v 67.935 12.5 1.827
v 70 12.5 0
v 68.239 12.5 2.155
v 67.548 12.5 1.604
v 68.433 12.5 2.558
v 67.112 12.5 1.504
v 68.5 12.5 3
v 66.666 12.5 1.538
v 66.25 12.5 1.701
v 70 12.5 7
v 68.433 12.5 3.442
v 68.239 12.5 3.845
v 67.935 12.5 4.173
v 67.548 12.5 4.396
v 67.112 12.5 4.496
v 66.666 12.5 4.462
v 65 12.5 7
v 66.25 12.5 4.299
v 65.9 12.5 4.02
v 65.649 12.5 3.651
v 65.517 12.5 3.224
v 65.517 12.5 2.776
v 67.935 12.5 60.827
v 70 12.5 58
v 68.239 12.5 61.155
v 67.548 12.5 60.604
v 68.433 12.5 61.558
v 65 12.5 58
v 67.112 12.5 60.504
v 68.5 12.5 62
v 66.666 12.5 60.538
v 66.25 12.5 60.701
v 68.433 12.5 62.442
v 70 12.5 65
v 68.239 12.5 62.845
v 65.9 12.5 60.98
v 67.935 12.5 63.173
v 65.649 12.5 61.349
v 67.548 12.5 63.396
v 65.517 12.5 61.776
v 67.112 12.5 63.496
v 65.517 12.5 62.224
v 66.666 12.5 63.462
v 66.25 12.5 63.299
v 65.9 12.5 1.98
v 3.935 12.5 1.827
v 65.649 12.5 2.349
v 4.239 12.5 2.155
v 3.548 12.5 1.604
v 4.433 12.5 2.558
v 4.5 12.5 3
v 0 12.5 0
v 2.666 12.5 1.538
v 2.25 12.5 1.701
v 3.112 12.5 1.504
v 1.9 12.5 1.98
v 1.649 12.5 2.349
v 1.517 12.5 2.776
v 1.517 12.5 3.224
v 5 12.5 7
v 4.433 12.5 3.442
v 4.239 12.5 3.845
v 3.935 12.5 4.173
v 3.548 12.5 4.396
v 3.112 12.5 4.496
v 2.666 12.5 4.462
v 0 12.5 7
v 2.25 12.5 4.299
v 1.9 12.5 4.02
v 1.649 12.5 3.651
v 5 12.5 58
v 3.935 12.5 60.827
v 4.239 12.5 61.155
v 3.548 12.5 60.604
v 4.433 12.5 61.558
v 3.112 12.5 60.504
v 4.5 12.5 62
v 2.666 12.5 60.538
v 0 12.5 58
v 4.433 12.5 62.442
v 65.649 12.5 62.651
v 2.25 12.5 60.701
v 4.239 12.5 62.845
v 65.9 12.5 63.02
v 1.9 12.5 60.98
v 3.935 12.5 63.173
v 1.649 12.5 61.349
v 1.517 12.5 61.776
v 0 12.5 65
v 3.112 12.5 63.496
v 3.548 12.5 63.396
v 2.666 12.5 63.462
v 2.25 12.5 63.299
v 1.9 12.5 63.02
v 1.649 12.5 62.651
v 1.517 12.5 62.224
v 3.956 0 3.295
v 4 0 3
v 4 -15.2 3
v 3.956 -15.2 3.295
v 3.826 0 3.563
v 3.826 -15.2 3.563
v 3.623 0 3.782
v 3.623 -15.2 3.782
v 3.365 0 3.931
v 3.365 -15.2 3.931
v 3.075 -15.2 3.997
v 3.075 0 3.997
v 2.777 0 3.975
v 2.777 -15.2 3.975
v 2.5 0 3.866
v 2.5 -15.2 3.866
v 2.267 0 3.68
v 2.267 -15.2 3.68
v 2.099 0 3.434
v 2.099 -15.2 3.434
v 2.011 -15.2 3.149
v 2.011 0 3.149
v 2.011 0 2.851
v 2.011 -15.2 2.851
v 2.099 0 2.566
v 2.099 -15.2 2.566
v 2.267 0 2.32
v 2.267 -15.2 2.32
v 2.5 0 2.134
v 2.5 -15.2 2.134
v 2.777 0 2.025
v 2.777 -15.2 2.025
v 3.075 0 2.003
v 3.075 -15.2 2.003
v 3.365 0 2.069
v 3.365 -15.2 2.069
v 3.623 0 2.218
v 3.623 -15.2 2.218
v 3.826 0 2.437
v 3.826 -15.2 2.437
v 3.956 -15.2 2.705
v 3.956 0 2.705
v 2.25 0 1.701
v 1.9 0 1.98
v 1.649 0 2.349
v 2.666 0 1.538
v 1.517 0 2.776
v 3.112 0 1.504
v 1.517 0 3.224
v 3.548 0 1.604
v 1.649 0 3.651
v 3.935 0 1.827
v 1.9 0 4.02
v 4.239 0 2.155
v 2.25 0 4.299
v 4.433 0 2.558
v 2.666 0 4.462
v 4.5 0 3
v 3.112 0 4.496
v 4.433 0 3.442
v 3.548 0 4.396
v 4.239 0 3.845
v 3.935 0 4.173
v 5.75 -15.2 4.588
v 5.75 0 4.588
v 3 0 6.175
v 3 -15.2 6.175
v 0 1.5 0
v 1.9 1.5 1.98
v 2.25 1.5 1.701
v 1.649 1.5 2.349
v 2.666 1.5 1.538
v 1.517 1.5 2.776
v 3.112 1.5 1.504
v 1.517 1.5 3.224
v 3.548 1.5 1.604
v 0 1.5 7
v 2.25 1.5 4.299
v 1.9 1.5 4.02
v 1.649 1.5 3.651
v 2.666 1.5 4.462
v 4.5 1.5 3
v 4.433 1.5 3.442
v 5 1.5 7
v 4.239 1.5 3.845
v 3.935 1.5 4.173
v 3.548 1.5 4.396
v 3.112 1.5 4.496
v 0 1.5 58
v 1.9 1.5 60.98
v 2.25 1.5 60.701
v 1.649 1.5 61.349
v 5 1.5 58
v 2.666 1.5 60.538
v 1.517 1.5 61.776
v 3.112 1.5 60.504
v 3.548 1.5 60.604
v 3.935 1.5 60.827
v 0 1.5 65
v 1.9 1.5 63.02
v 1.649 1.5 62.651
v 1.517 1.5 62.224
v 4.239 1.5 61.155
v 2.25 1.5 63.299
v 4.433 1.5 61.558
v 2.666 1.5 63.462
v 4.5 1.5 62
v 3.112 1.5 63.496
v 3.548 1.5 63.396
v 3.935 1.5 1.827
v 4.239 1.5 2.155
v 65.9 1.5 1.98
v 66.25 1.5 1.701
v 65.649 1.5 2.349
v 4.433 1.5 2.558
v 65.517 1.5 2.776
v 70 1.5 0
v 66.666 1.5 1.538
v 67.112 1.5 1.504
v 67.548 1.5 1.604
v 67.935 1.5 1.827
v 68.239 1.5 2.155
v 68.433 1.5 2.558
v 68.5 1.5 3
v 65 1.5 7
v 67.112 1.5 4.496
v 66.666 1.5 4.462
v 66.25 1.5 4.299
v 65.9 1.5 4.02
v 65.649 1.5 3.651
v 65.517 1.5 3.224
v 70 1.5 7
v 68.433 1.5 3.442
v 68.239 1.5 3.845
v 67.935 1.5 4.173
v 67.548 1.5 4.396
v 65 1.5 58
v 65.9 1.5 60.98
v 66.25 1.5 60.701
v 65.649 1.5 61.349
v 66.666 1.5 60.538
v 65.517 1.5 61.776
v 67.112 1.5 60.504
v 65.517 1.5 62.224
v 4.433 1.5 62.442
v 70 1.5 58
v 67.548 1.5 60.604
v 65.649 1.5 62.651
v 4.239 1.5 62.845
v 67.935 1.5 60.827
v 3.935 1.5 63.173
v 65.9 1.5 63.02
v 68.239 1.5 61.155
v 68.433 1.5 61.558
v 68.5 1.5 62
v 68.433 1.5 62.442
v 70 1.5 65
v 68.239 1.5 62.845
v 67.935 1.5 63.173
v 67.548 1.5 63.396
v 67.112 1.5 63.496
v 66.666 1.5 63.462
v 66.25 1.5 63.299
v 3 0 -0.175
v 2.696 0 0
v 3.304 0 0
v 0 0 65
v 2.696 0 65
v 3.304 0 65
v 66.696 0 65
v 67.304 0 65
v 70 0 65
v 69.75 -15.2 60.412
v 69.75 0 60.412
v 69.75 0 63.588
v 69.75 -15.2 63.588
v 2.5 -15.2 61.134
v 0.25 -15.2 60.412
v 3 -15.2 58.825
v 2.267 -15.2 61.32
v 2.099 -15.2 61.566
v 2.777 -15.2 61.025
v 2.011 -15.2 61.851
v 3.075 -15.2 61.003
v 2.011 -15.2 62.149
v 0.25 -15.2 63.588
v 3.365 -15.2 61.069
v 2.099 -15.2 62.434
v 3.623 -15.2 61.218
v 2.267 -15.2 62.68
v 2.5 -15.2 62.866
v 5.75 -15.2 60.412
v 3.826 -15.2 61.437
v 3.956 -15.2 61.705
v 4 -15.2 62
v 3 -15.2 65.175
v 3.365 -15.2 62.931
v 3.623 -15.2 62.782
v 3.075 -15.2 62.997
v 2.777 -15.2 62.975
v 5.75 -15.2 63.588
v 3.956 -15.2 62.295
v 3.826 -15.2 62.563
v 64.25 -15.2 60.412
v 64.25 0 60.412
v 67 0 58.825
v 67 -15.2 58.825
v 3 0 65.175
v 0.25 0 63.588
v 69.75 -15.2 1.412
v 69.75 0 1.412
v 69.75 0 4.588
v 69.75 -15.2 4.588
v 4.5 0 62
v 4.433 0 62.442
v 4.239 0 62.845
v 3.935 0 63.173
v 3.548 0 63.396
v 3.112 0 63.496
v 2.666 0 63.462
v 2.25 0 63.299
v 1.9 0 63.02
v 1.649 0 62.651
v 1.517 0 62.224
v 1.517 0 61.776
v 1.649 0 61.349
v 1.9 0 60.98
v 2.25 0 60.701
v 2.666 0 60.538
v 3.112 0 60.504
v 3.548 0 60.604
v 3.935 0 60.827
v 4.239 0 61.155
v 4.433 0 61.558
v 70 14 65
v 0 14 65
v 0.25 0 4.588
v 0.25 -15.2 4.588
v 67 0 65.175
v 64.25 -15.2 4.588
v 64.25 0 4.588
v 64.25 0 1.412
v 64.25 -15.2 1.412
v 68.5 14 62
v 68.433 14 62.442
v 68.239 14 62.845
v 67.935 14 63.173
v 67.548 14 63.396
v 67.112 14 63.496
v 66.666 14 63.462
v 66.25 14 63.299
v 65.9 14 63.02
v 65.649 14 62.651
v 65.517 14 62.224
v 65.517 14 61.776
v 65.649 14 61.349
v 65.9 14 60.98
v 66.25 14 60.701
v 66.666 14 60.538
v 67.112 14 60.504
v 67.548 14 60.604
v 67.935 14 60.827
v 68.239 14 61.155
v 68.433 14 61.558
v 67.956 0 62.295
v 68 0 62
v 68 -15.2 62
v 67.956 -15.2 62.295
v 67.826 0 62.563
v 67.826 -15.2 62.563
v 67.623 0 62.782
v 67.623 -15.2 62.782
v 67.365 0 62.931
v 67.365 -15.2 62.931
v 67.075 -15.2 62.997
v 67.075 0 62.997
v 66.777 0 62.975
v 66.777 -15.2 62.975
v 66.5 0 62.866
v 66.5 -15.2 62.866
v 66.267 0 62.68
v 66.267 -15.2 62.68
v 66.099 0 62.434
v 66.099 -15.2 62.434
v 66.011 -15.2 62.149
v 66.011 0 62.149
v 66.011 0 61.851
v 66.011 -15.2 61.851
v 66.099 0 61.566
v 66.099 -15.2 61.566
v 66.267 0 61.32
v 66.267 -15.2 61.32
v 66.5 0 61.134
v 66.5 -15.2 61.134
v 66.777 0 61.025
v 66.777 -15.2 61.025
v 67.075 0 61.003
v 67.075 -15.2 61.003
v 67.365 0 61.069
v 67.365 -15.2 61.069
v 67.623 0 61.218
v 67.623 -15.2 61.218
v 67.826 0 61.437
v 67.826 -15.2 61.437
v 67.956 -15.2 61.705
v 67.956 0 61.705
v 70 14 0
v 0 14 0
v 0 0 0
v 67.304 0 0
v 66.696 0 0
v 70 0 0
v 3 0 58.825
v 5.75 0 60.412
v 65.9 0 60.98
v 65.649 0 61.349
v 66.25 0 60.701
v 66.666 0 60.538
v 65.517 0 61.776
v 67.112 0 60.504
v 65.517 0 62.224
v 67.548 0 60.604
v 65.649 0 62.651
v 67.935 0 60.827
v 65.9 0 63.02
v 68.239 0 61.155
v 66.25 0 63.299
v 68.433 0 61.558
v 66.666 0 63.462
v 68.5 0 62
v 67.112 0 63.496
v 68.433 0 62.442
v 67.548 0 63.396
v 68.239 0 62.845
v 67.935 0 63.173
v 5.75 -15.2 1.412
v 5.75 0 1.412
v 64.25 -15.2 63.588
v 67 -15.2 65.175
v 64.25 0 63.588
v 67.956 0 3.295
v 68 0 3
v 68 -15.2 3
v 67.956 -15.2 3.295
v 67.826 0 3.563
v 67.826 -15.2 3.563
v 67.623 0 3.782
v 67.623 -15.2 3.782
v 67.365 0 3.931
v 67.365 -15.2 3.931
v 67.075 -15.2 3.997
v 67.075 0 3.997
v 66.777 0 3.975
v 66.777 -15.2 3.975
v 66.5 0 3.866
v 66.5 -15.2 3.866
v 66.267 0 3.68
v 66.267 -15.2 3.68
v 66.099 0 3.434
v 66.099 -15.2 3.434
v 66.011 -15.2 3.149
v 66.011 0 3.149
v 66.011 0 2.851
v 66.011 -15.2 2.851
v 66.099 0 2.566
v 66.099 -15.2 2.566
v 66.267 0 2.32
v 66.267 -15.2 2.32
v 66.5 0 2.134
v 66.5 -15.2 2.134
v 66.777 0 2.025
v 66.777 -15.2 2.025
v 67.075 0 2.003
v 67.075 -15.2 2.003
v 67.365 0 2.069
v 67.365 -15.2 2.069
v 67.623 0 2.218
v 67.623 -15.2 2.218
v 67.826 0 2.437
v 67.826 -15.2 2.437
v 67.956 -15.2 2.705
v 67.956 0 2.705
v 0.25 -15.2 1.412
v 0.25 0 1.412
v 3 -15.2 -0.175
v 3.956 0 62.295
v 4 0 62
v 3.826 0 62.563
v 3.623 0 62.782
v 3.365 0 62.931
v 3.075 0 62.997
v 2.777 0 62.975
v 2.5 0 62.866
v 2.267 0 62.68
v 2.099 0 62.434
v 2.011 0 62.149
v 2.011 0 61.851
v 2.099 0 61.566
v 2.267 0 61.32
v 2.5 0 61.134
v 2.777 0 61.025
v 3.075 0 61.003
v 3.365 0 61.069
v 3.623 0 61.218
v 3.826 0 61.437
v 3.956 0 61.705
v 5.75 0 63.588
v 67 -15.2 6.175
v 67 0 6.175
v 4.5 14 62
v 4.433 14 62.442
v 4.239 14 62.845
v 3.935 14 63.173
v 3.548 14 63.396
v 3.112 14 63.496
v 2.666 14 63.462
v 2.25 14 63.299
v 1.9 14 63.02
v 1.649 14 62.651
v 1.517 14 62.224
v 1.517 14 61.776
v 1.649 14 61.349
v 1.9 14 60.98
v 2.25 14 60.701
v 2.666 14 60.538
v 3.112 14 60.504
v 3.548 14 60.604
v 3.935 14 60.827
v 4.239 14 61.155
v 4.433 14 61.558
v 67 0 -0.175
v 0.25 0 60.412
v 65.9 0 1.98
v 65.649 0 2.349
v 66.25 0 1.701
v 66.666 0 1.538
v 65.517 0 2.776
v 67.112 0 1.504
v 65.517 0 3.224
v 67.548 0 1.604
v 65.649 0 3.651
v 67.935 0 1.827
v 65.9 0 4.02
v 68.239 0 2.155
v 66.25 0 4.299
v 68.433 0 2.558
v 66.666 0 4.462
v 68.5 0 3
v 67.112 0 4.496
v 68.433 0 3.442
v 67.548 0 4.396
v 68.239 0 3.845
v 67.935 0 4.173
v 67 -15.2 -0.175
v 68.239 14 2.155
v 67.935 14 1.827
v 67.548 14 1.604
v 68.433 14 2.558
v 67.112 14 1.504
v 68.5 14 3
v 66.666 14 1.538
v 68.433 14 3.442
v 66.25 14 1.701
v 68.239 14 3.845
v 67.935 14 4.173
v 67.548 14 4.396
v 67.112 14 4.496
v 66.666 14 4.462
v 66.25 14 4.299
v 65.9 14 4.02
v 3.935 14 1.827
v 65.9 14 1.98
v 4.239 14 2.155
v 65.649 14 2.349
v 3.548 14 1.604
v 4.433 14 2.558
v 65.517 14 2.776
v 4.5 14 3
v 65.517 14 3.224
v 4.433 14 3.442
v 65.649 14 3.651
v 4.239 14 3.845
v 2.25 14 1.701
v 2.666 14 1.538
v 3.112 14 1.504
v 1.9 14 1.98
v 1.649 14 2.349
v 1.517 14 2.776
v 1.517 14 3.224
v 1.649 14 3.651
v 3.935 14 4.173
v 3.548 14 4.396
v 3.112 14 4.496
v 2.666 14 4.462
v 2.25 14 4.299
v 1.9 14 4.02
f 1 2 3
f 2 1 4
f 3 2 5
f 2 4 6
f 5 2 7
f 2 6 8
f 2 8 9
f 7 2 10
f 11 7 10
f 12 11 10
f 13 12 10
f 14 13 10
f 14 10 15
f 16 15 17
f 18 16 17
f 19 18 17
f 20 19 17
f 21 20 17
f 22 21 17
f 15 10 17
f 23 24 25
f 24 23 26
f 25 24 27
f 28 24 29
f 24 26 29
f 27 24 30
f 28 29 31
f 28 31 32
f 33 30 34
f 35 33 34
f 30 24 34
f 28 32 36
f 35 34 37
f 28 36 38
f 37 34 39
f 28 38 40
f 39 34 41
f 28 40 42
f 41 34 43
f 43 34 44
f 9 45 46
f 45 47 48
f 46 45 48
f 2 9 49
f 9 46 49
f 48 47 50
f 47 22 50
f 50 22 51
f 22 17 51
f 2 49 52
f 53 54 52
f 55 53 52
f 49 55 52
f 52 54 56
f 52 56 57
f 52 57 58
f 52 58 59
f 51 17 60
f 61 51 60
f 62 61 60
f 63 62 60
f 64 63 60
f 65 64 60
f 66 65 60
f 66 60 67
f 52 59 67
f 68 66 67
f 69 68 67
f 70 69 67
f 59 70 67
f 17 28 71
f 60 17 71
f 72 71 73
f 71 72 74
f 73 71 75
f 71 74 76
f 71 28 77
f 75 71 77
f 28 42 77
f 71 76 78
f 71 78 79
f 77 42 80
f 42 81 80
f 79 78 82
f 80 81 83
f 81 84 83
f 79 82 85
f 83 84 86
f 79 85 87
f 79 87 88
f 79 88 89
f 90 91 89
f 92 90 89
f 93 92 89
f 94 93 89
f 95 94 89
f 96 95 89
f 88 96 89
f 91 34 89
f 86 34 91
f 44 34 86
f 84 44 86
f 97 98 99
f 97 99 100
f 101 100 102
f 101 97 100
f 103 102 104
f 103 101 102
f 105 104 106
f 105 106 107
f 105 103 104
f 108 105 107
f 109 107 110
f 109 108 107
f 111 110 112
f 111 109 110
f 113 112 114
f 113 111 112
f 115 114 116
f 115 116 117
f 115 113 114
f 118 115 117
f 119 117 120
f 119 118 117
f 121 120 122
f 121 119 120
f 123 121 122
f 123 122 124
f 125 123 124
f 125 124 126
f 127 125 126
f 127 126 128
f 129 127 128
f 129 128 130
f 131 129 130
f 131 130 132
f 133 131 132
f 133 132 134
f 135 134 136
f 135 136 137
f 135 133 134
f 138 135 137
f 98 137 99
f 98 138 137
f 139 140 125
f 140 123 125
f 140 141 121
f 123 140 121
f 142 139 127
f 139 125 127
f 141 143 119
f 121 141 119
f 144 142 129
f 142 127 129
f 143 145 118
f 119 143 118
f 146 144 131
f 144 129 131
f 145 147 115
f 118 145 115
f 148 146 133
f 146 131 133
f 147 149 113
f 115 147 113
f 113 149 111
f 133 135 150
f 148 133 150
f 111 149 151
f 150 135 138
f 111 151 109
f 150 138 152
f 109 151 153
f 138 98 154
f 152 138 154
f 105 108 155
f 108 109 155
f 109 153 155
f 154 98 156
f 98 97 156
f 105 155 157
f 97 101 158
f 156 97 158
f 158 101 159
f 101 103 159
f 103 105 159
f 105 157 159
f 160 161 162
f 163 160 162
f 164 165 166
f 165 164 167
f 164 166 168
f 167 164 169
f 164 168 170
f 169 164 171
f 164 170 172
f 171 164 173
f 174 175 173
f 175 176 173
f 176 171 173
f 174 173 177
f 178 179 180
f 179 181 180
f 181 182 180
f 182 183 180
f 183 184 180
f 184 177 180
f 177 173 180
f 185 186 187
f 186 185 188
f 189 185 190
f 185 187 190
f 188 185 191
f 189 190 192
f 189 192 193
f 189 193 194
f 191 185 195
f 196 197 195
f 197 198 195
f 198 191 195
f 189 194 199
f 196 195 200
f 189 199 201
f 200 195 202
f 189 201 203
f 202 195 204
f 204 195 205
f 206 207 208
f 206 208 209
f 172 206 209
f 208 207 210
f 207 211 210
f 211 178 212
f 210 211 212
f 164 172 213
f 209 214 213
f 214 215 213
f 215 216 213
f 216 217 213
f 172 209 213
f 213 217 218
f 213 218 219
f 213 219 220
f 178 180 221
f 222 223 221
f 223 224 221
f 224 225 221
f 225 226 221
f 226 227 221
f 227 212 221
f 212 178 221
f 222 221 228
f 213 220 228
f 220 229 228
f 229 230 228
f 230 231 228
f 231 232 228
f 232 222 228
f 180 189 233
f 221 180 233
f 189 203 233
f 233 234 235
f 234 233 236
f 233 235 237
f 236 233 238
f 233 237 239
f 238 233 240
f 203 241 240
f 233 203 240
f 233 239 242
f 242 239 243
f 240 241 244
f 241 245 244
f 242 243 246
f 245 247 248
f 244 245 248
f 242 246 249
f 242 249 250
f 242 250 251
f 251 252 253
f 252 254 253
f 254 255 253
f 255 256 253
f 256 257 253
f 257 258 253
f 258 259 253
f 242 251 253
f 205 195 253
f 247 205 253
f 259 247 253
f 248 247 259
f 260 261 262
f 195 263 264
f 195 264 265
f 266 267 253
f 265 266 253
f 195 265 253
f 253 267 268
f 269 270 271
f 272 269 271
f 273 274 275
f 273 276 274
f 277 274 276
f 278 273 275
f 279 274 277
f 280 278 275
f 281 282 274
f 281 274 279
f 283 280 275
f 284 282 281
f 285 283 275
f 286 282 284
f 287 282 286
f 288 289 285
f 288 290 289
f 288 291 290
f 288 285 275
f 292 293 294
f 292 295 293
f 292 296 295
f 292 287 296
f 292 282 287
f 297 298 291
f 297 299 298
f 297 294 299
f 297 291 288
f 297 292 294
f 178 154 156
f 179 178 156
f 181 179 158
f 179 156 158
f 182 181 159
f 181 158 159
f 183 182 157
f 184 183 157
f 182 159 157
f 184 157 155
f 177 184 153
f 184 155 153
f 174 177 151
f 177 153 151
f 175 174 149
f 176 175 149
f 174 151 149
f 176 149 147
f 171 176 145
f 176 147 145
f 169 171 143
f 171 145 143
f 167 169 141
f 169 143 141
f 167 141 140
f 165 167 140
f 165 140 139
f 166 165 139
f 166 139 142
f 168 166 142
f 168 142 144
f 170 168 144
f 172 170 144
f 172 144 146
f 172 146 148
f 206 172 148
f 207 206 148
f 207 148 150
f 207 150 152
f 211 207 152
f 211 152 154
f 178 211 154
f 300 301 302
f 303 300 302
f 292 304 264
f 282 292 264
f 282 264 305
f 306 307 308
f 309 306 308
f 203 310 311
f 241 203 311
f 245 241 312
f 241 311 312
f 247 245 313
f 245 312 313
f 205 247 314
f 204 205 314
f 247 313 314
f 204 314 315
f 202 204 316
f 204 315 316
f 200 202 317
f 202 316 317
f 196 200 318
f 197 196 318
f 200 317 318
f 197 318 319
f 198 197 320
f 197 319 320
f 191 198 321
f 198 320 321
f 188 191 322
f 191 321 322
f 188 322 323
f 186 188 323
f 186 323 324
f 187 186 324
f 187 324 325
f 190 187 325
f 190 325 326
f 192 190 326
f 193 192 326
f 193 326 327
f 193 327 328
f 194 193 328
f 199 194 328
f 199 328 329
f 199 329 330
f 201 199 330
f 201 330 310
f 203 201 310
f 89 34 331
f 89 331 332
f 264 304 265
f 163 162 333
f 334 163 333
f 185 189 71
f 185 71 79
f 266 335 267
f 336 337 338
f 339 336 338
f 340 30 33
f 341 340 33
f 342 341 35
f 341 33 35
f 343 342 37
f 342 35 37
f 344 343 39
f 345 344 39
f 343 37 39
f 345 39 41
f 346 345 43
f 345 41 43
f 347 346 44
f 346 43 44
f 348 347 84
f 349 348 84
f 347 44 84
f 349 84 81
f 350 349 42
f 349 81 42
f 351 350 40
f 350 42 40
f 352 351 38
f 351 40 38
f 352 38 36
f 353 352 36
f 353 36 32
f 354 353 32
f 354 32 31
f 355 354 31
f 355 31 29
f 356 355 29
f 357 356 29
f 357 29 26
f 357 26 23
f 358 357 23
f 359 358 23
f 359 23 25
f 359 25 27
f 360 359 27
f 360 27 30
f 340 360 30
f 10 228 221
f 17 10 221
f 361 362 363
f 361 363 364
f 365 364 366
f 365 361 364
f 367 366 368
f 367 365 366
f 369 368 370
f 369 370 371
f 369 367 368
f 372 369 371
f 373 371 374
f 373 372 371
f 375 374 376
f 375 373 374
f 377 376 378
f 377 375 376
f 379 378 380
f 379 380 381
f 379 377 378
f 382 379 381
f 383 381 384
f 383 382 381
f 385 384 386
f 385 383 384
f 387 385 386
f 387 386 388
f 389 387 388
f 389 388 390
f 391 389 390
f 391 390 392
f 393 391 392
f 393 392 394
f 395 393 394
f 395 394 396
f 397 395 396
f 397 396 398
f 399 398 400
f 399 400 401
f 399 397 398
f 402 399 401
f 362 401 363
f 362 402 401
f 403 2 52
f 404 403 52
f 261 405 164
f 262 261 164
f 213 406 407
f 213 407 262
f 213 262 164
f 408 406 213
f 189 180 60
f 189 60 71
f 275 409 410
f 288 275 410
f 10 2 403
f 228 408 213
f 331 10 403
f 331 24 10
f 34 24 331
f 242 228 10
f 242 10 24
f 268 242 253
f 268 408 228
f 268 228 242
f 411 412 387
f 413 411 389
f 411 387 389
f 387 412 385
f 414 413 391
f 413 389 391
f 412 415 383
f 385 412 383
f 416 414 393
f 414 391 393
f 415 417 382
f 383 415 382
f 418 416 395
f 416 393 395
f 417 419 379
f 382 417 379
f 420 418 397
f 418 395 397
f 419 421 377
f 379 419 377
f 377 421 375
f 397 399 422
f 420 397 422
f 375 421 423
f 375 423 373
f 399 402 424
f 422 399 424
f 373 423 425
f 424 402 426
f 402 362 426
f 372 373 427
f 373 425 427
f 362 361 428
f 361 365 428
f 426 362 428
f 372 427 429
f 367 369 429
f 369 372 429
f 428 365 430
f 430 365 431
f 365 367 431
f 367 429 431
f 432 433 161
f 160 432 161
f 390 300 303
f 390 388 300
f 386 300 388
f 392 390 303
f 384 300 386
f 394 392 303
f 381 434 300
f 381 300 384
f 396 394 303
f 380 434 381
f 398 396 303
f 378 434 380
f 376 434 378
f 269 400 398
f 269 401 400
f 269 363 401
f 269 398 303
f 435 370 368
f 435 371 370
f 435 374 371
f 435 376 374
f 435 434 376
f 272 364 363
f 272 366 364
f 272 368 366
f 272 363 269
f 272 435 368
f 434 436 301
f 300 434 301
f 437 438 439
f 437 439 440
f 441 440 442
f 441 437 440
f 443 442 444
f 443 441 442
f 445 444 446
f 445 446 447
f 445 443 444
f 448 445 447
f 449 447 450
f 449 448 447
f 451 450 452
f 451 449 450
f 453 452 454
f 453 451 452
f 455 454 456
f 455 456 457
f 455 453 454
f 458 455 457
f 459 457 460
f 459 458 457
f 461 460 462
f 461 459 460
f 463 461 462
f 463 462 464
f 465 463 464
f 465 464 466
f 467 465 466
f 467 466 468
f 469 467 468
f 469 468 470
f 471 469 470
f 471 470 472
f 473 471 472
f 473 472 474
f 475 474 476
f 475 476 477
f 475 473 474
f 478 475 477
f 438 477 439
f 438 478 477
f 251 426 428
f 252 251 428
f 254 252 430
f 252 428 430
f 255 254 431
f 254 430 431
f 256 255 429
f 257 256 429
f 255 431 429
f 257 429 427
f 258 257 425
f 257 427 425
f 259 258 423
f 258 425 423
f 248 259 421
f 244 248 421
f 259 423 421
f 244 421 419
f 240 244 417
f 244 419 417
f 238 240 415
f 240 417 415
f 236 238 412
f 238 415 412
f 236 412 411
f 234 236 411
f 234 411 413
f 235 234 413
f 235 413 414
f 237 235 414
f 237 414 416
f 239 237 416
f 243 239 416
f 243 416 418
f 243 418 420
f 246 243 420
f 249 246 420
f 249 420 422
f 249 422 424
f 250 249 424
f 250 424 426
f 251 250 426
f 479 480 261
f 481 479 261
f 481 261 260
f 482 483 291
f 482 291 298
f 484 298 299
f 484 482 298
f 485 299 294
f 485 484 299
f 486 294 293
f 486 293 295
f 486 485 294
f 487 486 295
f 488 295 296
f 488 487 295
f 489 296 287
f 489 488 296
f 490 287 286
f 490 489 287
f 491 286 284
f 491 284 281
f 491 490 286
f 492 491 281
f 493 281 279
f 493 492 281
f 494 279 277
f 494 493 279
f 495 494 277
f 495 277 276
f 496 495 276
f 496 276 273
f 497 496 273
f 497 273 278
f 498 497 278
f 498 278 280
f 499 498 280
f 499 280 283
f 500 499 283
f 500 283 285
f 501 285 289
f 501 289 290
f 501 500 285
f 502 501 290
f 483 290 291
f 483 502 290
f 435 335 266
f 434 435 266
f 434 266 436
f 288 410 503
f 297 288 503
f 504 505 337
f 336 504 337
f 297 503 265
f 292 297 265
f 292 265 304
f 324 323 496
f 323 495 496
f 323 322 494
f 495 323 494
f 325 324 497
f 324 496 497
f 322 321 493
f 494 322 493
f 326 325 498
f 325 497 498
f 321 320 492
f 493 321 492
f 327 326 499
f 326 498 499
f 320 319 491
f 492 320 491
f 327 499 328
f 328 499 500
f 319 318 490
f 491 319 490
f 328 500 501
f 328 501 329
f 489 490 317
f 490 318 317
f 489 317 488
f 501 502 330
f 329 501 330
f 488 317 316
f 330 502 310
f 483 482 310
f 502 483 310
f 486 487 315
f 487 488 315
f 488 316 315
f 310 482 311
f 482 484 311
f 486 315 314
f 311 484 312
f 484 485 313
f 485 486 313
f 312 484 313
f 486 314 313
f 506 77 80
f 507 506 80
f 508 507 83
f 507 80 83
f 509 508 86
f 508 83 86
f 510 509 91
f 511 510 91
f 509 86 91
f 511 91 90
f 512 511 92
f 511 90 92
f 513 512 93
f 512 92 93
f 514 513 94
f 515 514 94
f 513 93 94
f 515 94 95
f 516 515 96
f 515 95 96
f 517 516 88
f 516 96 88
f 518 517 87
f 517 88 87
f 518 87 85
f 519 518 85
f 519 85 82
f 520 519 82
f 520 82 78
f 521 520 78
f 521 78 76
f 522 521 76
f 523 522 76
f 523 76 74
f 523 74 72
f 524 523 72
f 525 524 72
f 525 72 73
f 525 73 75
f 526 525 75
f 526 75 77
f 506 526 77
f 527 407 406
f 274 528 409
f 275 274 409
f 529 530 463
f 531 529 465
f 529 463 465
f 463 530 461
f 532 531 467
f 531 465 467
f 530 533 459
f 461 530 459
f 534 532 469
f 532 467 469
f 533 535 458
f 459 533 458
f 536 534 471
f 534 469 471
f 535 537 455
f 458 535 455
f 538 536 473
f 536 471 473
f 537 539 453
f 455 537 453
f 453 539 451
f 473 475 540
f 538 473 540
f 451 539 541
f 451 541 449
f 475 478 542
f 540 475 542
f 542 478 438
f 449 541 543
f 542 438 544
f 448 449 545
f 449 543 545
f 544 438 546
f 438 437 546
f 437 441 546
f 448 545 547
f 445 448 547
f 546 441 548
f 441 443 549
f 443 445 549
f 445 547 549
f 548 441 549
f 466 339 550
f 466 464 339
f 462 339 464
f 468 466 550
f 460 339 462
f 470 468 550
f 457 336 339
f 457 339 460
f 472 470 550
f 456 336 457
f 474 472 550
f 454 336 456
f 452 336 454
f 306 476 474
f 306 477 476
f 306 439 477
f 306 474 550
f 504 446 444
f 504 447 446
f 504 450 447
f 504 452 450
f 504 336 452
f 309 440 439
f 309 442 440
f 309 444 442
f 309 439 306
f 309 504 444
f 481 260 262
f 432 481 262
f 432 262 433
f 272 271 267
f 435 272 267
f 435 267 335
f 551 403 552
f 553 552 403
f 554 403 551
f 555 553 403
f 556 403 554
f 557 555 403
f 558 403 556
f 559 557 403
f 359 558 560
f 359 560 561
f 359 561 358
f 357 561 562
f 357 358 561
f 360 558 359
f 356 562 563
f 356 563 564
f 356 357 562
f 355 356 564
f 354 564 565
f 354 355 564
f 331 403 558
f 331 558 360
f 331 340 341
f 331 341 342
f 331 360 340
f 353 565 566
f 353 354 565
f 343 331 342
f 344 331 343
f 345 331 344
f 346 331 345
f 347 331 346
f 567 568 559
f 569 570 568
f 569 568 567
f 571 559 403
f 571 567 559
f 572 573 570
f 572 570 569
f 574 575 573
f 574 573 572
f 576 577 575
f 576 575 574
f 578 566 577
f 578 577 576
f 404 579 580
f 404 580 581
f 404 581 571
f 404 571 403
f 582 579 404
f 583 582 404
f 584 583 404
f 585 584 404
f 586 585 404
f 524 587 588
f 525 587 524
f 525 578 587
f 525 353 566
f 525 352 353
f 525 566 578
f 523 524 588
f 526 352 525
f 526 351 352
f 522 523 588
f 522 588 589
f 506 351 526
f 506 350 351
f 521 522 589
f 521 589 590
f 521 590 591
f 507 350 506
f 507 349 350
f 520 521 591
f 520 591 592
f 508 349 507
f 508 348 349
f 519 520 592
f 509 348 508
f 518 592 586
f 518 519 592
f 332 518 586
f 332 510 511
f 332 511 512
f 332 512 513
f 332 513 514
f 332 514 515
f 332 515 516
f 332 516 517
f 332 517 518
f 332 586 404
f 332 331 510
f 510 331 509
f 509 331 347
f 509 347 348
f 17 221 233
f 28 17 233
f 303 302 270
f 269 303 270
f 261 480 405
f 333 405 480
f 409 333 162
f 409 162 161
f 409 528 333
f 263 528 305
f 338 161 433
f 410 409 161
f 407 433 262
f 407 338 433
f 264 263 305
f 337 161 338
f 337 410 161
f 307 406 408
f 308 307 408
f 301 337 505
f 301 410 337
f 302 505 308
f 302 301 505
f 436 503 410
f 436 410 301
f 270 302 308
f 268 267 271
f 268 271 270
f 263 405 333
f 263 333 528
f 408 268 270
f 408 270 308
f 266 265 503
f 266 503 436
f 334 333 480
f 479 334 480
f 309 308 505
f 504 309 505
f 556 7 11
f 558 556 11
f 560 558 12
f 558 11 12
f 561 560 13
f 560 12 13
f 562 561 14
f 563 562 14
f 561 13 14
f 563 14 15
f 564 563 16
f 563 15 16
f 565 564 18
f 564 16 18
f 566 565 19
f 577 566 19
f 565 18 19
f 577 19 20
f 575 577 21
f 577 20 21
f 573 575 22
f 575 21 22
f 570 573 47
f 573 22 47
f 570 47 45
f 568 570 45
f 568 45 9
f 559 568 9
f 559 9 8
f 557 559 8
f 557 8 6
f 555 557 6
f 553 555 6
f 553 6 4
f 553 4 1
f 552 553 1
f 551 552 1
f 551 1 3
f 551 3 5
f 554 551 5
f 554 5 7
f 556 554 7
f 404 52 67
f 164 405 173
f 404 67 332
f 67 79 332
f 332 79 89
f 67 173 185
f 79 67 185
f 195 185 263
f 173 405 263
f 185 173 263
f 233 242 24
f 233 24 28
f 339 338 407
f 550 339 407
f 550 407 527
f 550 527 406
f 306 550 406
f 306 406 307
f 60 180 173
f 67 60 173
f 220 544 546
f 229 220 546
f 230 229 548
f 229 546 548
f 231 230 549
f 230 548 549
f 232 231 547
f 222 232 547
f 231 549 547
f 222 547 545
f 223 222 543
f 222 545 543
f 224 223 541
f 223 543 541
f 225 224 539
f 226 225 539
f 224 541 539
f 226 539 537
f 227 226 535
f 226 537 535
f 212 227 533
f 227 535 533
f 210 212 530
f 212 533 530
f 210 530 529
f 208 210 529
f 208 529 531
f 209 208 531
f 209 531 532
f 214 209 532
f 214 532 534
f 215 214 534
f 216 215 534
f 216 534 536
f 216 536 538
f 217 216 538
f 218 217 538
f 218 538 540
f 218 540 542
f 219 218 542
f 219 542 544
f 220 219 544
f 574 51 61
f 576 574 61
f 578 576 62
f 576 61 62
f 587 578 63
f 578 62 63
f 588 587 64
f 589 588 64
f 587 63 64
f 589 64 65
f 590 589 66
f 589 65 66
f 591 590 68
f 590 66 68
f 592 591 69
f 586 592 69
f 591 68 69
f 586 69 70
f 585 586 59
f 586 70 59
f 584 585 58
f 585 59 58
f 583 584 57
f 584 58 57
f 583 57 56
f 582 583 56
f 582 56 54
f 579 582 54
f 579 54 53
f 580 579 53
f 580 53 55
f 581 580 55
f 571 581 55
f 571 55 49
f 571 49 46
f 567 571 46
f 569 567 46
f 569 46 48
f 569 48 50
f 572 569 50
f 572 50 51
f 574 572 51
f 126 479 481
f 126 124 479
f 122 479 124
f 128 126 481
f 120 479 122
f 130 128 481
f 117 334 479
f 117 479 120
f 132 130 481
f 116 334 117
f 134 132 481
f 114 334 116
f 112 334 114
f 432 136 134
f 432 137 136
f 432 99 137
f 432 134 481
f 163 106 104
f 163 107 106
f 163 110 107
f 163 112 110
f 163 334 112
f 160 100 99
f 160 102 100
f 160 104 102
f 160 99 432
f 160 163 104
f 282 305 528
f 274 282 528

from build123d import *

# Parameters (mm, degrees)
F0_W     = 70
F0_H     = 65
F1_DEPTH = 1.5
F2_W     = 5
F2_H     = 51
F3_DEPTH = 11
F4_W     = 70
F4_H     = 65
F5_DEPTH = 1.5
F6_R     = 1.5
F7_DEPTH = 25
F8_R     = 1
F9_DEPTH = 15.2


with BuildPart() as f1:
    # F0 (on Front) → F1 (new body)
    with BuildSketch(Plane.XZ):
        with Locations((35, 32.5)):
            Rectangle(F0_W, F0_H)
    extrude(amount=-F1_DEPTH)

    # F2 (on face) → F3 (join)
    with BuildSketch(Plane(origin=(0, 1.5, 0), x_dir=(-1, 0, 0), z_dir=(0, 1, 0))):
        with Locations((-67.5, 32.5)):
            Rectangle(F2_W, F2_H)
        with Locations((-2.5, 32.5)):
            Rectangle(F2_W, F2_H)
    extrude(amount=F3_DEPTH)

    # F4 (on face) → F5 (join)
    with BuildSketch(Plane(origin=(0, 12.5, 0), x_dir=(-1, 0, 0), z_dir=(0, 1, 0))):
        with Locations((-35, 32.5)):
            Rectangle(F4_W, F4_H)
    extrude(amount=F5_DEPTH)

    # F6 (on Front) → F7 (cut)
    with BuildSketch(Plane.XZ):
        with Locations((3, 62)):
            Circle(F6_R)
        with Locations((67, 62)):
            Circle(F6_R)
        with Locations((3, 3)):
            Circle(F6_R)
        with Locations((67, 3)):
            Circle(F6_R)
    extrude(amount=-F7_DEPTH, mode=Mode.SUBTRACT)

    # F8 (on face) → F9 (join)
    with BuildSketch(Plane.XZ):
        Polygon((5.75, 60.412287), (5.75, 63.587713), (3, 65.175426), (0.25, 63.587713), (0.25, 60.412287), (3, 58.824574), align=None)
        with Locations((3, 62)):
            Circle(F8_R, mode=Mode.SUBTRACT)
        Polygon((5.75, 1.412287), (5.75, 4.587713), (3, 6.175426), (0.25, 4.587713), (0.25, 1.412287), (3, -0.175426), align=None)
        with Locations((3, 3)):
            Circle(F8_R, mode=Mode.SUBTRACT)
        Polygon((67, 58.824574), (69.75, 60.412287), (69.75, 63.587713), (67, 65.175426), (64.25, 63.587713), (64.25, 60.412287), align=None)
        with Locations((67, 62)):
            Circle(F8_R, mode=Mode.SUBTRACT)
        Polygon((67, -0.175426), (69.75, 1.412287), (69.75, 4.587713), (67, 6.175426), (64.25, 4.587713), (64.25, 1.412287), align=None)
        with Locations((67, 3)):
            Circle(F8_R, mode=Mode.SUBTRACT)
    extrude(amount=F9_DEPTH)


solid = f1.part
